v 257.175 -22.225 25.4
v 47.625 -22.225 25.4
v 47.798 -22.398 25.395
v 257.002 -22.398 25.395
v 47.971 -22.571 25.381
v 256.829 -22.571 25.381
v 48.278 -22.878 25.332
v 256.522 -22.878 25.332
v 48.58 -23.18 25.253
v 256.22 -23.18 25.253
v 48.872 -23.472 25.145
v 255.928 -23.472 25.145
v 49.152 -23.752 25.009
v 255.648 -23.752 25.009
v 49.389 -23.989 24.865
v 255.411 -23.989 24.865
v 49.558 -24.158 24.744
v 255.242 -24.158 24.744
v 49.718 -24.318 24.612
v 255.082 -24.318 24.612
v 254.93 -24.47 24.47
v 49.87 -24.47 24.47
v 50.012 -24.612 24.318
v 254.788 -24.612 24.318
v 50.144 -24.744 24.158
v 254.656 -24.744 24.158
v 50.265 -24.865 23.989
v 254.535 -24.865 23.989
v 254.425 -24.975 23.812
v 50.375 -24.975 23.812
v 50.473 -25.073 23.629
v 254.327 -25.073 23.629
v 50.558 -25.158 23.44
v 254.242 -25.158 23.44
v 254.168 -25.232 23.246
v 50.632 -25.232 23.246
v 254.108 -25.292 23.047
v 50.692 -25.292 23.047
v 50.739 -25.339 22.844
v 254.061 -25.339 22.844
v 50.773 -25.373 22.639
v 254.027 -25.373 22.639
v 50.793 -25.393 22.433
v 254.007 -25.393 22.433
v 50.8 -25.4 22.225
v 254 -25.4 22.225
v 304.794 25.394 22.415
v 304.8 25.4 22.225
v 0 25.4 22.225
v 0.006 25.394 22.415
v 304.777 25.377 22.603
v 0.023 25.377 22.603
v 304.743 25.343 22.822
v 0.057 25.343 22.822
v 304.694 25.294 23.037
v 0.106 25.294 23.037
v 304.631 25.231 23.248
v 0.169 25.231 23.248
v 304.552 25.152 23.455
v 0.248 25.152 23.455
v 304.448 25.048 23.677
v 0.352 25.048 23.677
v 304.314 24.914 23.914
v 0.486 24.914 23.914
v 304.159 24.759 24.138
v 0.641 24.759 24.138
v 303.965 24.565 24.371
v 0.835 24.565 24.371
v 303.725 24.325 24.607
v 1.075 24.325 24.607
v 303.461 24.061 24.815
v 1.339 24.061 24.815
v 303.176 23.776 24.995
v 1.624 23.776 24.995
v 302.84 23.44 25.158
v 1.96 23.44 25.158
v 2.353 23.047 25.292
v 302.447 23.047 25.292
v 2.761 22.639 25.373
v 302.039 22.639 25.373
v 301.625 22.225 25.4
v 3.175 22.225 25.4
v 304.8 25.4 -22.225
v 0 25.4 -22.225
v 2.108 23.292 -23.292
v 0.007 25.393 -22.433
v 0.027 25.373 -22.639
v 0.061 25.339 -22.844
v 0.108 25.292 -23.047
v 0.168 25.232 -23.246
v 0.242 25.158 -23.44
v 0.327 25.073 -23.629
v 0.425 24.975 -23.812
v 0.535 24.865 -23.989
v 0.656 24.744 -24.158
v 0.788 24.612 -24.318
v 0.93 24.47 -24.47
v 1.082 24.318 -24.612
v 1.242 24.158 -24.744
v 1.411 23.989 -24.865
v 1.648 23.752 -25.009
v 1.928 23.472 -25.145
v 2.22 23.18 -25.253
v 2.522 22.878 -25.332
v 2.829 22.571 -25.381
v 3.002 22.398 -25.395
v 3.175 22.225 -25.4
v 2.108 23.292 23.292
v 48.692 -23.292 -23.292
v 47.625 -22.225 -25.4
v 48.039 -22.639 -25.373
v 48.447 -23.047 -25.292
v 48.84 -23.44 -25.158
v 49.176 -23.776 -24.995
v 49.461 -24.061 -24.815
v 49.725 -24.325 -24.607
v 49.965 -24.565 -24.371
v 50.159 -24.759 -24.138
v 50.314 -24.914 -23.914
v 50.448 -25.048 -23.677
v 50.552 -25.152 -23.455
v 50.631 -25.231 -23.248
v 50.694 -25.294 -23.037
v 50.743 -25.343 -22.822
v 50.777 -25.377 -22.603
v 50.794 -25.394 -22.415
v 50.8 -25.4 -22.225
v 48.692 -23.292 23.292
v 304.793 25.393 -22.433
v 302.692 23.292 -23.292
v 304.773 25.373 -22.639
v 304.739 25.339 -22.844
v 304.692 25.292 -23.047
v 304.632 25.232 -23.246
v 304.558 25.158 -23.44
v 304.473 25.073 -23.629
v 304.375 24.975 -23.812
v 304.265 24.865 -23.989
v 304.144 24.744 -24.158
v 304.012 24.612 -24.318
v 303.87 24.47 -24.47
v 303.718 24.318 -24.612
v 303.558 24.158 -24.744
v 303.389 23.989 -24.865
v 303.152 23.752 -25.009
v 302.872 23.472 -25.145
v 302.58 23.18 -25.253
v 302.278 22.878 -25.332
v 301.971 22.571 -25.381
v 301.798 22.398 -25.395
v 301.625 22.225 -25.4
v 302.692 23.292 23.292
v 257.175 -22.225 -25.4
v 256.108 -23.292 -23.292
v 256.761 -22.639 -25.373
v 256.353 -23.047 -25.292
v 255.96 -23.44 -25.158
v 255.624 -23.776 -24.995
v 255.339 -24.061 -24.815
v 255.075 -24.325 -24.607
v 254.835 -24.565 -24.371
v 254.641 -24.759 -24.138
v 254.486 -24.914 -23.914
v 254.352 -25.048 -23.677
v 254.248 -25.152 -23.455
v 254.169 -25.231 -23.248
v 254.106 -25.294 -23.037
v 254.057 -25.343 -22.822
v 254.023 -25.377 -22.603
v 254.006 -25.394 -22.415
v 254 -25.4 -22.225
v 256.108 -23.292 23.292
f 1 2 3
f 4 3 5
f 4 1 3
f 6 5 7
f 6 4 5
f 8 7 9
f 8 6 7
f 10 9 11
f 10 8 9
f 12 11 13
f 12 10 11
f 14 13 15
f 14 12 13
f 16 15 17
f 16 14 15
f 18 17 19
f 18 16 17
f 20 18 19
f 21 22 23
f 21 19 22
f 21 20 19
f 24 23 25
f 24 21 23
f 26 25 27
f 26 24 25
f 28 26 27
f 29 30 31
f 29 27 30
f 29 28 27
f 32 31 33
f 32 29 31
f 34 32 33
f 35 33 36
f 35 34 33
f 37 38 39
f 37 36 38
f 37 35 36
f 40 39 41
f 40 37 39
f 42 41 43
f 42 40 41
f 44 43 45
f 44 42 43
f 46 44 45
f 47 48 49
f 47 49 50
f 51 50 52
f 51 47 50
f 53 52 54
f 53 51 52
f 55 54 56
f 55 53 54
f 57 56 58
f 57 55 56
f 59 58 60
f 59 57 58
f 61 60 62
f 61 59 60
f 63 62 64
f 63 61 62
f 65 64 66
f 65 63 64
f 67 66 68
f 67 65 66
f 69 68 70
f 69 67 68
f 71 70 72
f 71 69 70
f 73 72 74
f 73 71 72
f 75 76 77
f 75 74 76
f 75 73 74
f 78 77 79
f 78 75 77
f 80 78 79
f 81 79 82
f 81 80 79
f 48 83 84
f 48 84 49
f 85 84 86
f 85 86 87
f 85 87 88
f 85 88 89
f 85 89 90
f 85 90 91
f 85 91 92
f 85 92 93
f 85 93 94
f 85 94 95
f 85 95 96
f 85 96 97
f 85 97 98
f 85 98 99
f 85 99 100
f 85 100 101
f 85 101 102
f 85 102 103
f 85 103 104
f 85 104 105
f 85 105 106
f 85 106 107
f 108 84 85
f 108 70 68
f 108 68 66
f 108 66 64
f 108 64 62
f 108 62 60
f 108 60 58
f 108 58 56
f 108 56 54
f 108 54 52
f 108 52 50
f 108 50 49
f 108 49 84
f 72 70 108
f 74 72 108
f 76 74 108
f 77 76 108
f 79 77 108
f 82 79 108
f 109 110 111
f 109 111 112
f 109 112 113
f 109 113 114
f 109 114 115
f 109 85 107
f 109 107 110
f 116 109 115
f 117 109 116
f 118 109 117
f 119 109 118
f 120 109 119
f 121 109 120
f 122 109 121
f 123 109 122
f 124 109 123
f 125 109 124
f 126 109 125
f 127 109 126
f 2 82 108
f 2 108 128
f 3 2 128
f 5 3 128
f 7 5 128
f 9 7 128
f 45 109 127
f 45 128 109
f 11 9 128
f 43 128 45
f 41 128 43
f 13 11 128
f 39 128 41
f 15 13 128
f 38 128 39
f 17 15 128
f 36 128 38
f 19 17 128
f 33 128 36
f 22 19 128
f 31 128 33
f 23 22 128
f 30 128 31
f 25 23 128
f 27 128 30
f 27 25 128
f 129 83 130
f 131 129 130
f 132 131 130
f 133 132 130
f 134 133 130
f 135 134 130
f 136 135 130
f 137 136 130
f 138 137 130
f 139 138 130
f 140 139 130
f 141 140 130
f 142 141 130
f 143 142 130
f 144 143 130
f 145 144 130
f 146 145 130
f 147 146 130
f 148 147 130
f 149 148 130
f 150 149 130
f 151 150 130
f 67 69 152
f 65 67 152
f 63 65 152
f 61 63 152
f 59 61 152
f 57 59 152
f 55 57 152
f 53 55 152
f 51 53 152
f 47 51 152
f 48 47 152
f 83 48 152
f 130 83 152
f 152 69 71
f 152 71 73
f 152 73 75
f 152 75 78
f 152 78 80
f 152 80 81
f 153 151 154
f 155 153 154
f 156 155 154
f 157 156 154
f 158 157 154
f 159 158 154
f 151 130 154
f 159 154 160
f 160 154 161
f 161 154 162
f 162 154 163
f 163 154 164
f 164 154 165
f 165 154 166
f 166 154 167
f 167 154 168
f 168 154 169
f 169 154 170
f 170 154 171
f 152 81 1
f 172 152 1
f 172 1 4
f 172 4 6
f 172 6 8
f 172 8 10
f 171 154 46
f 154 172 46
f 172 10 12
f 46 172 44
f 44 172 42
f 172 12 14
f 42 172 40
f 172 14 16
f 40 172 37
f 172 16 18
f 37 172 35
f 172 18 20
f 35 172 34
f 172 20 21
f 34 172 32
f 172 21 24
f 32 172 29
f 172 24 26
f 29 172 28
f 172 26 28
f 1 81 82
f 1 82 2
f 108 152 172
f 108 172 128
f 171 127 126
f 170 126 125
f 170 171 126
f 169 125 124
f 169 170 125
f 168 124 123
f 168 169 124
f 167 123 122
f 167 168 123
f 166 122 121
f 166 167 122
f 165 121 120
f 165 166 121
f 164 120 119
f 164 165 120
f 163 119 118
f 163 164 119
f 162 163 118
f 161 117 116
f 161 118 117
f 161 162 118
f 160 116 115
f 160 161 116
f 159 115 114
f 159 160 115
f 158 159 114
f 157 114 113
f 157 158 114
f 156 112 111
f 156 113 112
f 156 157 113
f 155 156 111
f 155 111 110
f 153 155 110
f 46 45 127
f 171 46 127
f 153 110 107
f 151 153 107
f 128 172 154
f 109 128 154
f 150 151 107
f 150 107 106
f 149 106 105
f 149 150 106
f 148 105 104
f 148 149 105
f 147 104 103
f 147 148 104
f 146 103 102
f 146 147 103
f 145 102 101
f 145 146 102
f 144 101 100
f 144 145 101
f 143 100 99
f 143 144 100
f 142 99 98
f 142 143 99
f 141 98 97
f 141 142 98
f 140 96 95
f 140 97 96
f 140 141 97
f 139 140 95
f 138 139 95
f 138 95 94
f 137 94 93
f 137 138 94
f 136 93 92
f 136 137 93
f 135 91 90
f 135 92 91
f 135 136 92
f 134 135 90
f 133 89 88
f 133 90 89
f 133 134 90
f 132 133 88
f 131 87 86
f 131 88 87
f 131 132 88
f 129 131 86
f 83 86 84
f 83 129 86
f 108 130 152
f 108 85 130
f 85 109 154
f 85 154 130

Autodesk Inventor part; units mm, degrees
ref_plane "YZ Plane" through (0, 0, 0) normal (1, 0, 0) x (0, 1, 0)
ref_plane "XZ Plane" through (0, 0, 0) normal (0, 1, 0) x (-1, 0, 0)
ref_plane "XY Plane" through (0, 0, 0) normal (0, 0, 1) x (1, 0, 0)
sketch "Sketch1" plane through (0, 0, 0) normal (1, 0, 0) x (0, 1, 0)
  line L0 (25.4, 25.4) -> (-25.4, 25.4)
  line L1 (-25.4, 25.4) -> (-25.4, -25.4)
  line L2 (-25.4, -25.4) -> (25.4, -25.4)
  line L3 (25.4, -25.4) -> (25.4, 25.4)
  line L4 (23.2918, 23.2918) -> (-23.2918, 23.2918)
  line L5 (-23.2918, 23.2918) -> (-23.2918, -23.2918)
  line L6 (-23.2918, -23.2918) -> (23.2918, -23.2918)
  line L7 (23.2918, -23.2918) -> (23.2918, 23.2918)
  point P0 (0, 0)
  point P1 (0, -25.4)
  point P2 (25.4, 0)
  dimension "d0" = 50.8
  dimension "d1" = 50.8
  dimension "d2" = 2.1082
extrude "Extrusion1" add sketch "Sketch1" along normal blind 304.8
fillet "Fillet1" radius 3.175 4 edges at (152.4, 25.4, 25.4) (152.4, -25.4, 25.4) (152.4, 25.4, -25.4) (152.4, -25.4, -25.4)
sketch "Sketch2" plane through (0, -22.225, 25.4) normal (0, 0, 1) x (1, 0, 0)
  line L0 (0, 44.45) -> (0, 0) projected
  line L1 (304.8, 44.45) -> (304.8, 0) projected
  line L2 (0, -3.175) -> (0, 47.625)
  line L3 (0, 45.5168) -> (0, -1.0668) projected
  line L4 (0, 47.625) -> (50.8, -3.175)
  line L5 (0, -3.175) -> (50.8, -3.175)
  line L6 (304.8, -3.175) -> (304.8, 47.625)
  line L7 (304.8, 47.625) -> (254, -3.175)
  line L8 (254, -3.175) -> (304.8, -3.175)
  line L9 (0, -3.175) -> (304.8, -3.175) projected
  point P0 (0, 22.225)
  dimension "d6" = 45
  dimension "d7" = 45
extrude "Extrusion2" cut sketch "Sketch2" against normal through all
properties part number "45degree_brace" material "Steel"
